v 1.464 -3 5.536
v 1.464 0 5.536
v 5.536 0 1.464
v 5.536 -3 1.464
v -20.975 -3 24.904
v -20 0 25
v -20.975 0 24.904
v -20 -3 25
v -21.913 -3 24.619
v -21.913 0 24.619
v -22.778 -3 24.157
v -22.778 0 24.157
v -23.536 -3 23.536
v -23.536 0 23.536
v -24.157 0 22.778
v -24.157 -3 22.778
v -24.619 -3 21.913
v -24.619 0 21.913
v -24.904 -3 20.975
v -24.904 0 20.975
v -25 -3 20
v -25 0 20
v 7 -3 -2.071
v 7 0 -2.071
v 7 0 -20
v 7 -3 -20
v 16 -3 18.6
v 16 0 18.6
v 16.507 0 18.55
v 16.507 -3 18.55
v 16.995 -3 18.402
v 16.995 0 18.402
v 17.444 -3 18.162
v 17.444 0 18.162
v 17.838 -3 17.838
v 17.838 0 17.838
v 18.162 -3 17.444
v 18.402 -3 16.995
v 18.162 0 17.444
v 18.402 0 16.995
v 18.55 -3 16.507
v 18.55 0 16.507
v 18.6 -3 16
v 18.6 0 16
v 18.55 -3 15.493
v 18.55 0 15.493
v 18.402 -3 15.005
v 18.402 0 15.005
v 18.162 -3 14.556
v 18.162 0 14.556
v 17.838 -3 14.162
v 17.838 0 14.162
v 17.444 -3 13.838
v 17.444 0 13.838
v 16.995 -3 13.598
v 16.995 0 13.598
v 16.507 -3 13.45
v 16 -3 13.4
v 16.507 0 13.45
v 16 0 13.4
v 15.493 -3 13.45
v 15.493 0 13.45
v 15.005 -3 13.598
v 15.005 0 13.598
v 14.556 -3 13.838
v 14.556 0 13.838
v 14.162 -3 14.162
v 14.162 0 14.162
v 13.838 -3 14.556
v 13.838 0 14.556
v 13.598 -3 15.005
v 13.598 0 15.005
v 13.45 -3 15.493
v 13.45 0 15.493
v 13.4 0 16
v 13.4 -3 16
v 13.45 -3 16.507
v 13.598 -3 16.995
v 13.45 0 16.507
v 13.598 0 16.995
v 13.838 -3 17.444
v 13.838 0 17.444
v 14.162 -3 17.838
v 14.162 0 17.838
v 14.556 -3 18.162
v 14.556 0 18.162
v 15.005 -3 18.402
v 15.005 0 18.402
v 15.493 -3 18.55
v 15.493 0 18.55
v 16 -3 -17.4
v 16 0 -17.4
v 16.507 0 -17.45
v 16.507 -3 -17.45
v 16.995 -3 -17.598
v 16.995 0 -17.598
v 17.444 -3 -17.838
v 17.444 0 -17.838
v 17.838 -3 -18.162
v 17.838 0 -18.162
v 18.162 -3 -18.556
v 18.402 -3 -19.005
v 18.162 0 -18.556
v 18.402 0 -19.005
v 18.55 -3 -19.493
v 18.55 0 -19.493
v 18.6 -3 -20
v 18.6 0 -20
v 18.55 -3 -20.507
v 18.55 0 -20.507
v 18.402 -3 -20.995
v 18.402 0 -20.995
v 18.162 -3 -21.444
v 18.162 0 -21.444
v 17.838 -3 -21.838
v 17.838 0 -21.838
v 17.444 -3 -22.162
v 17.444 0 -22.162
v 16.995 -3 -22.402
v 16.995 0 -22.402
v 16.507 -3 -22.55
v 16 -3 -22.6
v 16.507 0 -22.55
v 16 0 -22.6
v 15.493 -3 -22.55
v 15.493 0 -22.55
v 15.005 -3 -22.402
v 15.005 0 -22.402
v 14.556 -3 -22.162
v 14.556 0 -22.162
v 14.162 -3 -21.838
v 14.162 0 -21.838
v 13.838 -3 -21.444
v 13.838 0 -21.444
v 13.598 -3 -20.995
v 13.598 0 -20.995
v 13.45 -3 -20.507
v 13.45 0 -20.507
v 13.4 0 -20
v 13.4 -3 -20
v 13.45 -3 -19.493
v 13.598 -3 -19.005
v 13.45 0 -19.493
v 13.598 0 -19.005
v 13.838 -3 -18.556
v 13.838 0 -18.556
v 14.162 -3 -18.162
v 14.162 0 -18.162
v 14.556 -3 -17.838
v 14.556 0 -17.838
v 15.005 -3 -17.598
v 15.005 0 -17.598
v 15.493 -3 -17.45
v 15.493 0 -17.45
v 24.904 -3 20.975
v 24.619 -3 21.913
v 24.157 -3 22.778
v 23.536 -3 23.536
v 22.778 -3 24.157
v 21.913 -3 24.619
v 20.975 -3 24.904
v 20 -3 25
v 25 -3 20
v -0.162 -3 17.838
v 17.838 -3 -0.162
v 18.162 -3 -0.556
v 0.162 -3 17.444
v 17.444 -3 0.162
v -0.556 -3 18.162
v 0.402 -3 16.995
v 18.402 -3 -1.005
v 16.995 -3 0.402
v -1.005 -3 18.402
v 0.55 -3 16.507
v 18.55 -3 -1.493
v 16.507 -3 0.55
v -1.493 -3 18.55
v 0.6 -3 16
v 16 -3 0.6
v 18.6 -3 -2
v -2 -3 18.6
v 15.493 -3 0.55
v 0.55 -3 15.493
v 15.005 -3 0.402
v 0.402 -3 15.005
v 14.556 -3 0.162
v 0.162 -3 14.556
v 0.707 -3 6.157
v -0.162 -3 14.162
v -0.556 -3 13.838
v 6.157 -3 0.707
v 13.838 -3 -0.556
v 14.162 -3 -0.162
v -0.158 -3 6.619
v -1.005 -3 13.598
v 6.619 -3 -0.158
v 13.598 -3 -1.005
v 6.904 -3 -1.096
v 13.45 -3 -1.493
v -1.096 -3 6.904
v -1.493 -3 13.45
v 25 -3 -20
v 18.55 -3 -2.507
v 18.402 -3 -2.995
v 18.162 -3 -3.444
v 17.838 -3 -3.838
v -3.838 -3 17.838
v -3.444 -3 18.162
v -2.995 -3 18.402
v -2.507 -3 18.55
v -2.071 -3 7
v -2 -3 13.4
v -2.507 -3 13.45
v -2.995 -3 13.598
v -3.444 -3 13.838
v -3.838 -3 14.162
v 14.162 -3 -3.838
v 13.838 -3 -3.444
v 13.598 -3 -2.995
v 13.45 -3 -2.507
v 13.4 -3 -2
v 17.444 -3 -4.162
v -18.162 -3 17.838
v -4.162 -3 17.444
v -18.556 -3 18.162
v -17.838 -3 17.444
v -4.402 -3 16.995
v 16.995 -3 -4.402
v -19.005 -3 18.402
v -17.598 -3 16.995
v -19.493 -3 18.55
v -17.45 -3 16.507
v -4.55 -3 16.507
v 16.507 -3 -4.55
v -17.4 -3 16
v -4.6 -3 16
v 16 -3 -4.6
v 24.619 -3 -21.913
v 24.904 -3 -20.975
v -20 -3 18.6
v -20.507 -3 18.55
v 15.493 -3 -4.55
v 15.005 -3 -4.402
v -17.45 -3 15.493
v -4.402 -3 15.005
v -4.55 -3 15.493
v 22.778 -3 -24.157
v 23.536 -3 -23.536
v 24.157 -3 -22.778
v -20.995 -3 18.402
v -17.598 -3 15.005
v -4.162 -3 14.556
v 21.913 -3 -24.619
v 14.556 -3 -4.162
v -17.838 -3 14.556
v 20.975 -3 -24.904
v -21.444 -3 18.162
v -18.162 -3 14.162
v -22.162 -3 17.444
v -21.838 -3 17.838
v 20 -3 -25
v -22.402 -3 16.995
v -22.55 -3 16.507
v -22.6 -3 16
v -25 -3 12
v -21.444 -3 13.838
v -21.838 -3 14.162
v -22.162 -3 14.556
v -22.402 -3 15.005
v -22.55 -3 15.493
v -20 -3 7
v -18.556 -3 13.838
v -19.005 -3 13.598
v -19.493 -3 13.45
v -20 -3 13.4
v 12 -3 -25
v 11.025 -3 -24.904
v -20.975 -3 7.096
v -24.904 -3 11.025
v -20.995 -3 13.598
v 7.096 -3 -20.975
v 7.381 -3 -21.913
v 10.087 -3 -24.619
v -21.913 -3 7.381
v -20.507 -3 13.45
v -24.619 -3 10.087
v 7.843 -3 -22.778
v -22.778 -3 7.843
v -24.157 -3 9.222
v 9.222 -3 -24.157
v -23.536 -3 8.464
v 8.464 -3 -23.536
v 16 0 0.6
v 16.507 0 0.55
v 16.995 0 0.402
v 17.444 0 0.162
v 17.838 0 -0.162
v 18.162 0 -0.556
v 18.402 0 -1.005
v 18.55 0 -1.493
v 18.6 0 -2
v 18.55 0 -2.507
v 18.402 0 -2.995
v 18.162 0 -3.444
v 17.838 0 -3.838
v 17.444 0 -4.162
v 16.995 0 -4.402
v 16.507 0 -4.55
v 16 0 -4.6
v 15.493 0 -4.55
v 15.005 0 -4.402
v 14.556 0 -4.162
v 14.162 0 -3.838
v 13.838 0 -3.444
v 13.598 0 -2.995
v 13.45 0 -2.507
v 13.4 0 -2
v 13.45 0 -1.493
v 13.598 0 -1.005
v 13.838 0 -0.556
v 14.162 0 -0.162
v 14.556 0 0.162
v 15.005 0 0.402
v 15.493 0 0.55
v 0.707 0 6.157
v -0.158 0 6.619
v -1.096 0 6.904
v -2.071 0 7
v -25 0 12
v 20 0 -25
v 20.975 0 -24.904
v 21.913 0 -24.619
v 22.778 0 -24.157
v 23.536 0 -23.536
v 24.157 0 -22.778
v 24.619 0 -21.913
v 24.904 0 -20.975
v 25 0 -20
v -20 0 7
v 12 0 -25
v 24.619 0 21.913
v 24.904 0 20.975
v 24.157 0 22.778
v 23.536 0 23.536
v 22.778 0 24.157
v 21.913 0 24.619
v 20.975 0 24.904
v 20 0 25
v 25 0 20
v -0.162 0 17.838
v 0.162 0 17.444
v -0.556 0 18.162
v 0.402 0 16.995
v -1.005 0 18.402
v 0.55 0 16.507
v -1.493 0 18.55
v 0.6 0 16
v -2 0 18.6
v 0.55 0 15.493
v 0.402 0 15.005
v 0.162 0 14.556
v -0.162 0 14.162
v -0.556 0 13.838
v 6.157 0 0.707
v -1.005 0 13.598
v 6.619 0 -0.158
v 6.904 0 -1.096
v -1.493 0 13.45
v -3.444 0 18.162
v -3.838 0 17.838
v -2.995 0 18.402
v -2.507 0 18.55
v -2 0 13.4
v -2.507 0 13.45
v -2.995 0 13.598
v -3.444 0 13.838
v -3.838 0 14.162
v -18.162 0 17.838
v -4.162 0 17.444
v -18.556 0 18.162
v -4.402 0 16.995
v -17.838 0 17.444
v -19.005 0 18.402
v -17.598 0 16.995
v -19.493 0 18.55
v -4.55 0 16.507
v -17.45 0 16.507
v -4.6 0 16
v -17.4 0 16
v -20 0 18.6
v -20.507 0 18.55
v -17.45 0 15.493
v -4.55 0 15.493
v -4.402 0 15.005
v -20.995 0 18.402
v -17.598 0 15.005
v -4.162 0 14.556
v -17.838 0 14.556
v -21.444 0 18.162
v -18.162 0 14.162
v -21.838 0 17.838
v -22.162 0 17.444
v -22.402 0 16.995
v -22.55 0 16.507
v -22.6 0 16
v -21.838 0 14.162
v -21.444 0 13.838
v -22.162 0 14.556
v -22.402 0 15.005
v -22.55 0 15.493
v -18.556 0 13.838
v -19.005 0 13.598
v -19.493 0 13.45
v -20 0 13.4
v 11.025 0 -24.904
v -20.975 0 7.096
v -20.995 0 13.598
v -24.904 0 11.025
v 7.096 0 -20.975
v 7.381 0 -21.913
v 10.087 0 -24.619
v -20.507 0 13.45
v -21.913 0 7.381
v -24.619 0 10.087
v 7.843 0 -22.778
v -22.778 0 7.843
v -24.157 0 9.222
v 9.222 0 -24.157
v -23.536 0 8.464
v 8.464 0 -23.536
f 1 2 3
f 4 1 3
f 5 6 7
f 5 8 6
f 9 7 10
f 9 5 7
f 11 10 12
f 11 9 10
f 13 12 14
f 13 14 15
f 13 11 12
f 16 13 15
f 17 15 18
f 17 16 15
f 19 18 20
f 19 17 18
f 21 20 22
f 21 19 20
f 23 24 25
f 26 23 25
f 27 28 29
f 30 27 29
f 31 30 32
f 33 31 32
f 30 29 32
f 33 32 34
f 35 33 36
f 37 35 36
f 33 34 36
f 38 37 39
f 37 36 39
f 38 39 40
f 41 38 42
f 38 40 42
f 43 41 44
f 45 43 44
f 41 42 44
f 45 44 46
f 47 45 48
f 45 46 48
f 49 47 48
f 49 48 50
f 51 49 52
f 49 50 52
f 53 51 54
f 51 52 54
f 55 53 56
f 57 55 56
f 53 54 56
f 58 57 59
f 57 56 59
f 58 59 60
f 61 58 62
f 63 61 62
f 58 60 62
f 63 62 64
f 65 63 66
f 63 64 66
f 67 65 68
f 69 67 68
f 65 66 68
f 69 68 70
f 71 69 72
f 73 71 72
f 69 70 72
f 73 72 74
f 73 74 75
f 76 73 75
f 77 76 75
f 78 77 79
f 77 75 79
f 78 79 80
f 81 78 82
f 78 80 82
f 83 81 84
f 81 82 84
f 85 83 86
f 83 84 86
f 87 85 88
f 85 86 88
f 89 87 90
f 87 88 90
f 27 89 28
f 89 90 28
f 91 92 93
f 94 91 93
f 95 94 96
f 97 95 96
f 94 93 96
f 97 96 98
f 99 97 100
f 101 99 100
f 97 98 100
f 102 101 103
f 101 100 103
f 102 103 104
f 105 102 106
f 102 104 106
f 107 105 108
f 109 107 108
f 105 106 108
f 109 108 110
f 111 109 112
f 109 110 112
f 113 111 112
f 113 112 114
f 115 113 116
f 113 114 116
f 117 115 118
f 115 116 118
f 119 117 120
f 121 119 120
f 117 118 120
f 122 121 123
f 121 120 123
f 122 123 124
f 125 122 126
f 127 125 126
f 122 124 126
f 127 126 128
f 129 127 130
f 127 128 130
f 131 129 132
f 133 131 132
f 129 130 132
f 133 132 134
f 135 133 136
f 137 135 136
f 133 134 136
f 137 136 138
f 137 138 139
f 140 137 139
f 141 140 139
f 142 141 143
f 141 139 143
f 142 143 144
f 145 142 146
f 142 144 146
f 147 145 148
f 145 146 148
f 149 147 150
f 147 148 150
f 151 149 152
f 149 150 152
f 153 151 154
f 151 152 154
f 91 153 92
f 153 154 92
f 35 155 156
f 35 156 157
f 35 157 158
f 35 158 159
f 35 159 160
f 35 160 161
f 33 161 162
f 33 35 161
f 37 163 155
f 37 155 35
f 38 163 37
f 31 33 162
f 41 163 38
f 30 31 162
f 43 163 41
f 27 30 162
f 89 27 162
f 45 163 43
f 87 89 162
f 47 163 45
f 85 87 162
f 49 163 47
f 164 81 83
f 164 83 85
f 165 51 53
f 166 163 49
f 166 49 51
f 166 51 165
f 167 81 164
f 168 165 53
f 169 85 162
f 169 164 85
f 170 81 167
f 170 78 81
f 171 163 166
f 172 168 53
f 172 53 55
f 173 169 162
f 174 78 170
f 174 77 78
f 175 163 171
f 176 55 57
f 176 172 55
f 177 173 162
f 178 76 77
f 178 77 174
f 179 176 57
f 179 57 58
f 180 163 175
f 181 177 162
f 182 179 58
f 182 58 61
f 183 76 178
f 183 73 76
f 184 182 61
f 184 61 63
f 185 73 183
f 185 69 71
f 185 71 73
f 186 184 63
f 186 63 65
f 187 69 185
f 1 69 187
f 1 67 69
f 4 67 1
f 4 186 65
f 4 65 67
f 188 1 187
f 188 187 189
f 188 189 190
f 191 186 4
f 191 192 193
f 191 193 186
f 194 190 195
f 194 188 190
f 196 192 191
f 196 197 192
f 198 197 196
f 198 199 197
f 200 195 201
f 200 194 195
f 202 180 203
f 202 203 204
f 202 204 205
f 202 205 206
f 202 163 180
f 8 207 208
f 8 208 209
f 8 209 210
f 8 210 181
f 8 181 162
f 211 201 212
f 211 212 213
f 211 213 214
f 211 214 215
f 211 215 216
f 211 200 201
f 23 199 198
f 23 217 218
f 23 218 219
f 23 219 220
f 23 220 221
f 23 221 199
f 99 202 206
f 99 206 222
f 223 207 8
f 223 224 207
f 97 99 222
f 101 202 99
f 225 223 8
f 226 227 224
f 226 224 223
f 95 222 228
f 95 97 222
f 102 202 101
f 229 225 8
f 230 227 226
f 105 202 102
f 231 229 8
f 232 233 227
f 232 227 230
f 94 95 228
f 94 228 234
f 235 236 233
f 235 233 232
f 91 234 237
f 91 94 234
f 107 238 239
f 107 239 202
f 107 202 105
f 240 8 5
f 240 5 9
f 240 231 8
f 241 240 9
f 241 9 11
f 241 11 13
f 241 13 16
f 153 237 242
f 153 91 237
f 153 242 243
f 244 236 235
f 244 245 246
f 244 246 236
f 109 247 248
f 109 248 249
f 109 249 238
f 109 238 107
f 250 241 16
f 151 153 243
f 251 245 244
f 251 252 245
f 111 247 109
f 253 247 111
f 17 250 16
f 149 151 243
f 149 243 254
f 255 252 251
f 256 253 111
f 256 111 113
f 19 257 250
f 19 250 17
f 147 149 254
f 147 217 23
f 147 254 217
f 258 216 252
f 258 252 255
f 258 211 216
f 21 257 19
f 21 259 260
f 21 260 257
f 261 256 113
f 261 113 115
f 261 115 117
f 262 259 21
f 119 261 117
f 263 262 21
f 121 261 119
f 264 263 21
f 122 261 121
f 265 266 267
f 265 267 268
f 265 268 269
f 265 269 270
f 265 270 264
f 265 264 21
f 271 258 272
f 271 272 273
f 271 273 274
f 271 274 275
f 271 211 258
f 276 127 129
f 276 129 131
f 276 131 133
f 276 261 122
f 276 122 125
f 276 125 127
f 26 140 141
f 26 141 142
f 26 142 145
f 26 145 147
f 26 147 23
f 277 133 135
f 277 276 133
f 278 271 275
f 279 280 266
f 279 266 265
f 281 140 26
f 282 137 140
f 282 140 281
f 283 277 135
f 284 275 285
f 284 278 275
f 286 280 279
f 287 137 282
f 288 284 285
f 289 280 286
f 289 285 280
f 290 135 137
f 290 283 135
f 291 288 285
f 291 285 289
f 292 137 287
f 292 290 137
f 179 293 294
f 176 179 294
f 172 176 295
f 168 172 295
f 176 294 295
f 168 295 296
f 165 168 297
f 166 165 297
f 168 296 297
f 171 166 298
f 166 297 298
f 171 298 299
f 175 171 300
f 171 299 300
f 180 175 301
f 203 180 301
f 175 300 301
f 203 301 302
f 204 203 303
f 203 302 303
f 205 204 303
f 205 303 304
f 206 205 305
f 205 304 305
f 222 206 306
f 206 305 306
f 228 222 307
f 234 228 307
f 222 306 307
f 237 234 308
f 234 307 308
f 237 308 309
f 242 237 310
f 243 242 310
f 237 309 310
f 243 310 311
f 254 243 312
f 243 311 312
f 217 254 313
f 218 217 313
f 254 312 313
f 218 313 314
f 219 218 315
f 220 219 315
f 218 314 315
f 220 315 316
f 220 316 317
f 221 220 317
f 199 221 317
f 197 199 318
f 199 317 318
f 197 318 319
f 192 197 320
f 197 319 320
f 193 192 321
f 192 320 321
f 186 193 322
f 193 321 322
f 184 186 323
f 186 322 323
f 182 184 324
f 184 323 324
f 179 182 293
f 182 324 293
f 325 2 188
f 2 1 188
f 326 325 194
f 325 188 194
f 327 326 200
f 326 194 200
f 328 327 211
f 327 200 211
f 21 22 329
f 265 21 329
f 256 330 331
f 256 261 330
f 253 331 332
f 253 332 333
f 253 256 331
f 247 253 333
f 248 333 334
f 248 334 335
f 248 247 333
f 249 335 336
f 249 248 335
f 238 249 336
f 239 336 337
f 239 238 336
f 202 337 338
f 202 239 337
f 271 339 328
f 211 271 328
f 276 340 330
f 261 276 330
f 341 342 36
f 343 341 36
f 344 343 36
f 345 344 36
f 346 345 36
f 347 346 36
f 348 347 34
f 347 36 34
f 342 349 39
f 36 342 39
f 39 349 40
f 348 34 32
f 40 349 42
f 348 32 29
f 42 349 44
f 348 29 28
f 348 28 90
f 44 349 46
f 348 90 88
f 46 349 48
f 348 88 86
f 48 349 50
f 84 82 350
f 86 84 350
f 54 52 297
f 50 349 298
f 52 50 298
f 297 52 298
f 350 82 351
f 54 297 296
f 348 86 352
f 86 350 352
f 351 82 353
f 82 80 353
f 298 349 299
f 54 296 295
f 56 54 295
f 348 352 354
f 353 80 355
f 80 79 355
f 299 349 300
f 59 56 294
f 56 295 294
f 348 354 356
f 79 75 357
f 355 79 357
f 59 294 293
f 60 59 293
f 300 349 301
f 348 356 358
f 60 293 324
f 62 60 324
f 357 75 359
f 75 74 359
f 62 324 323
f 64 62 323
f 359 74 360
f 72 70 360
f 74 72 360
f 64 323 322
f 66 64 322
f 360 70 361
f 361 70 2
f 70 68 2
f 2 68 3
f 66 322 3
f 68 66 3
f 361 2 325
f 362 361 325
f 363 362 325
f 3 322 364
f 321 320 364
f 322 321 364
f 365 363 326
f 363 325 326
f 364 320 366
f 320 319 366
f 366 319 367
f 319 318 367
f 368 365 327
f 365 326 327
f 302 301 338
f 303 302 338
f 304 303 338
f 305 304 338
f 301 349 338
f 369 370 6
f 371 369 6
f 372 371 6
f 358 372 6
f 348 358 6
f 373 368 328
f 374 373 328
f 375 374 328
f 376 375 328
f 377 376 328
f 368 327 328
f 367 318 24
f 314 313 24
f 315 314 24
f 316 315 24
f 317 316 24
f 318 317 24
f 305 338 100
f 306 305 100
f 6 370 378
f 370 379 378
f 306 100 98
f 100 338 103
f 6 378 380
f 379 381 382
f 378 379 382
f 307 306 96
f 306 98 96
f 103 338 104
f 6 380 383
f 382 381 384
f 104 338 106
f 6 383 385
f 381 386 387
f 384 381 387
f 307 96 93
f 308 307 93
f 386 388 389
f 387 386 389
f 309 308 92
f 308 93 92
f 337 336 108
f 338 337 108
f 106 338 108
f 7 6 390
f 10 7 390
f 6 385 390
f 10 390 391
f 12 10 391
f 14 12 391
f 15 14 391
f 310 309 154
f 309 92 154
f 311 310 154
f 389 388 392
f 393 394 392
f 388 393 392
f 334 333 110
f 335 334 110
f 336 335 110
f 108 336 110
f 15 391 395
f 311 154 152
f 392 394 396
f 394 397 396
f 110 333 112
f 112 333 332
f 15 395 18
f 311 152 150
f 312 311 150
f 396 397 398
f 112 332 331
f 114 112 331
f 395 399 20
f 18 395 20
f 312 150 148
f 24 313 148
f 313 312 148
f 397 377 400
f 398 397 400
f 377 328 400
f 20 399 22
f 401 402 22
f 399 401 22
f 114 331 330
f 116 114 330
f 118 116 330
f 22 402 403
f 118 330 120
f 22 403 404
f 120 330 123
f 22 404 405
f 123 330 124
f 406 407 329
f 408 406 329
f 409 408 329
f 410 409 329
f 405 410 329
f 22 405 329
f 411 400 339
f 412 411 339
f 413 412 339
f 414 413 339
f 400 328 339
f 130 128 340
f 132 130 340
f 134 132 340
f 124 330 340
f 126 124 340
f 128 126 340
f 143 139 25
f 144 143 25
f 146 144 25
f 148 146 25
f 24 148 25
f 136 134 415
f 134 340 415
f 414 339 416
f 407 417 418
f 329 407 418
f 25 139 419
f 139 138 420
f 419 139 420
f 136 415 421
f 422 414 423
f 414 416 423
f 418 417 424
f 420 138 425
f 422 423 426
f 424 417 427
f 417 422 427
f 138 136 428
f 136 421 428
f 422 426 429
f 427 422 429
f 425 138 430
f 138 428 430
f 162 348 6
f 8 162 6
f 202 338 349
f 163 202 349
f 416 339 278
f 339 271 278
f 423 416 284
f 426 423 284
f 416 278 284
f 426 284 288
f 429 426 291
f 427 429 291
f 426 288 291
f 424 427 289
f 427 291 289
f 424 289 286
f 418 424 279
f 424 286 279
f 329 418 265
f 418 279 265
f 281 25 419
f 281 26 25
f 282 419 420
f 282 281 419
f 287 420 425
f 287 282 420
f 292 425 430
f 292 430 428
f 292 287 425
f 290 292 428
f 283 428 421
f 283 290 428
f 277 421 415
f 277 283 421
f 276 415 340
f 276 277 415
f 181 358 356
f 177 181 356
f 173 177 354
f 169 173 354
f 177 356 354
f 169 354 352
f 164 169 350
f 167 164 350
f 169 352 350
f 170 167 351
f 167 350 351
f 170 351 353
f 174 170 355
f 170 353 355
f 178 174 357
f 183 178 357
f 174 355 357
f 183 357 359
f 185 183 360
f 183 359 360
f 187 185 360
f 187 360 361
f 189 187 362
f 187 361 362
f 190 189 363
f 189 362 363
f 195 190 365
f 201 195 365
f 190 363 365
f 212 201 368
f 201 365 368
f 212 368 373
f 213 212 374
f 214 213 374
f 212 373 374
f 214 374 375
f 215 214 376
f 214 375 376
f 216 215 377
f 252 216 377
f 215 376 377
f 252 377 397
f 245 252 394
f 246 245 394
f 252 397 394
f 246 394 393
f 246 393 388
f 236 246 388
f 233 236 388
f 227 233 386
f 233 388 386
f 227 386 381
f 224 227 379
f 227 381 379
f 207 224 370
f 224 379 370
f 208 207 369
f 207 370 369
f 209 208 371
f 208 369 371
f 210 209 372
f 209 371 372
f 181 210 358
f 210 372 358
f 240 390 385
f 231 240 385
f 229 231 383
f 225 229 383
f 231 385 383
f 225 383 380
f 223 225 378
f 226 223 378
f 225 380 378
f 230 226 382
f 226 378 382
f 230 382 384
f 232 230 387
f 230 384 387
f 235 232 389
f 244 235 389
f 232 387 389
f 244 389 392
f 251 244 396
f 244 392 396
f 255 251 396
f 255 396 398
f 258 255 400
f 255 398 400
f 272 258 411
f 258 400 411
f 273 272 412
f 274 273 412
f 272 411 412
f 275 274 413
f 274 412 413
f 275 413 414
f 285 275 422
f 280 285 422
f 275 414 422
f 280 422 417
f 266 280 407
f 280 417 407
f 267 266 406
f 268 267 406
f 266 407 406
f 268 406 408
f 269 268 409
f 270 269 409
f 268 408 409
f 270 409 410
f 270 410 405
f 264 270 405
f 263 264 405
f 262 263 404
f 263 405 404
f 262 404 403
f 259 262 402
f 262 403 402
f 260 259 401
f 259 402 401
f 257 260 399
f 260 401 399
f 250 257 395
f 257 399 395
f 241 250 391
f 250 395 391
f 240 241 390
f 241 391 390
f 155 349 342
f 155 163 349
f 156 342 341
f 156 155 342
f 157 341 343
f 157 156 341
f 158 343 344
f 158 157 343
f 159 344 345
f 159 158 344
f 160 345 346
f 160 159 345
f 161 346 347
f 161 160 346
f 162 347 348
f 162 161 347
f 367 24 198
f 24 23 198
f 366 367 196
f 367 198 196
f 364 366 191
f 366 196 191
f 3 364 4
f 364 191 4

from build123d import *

# Parameters (mm, degrees)
SKETCH1_R          = 2.6
BASE_FLANGE1_DEPTH = 3
FILLET1_R          = 5
FILLET2_R          = 5


# Sheet-metal steps are written as plain solids
with BuildPart() as part:
    # Sketch1 → Base-Flange1 (new body)
    with BuildSketch(Plane(origin=(0, 0, 0), x_dir=(1, 0, 0), z_dir=(0, 1, 0))):
        Polygon((7, 25), (25, 25), (25, -25), (-25, -25), (-25, -7), (0, -7), (7, 0), align=None)
        with Locations(Location((16, -16, 0), (0, 0, 270))):
            Circle(SKETCH1_R, mode=Mode.SUBTRACT)
        with Locations(Location((-2, -16, 0), (0, 0, 270))):
            Circle(SKETCH1_R, mode=Mode.SUBTRACT)
        with Locations(Location((-20, -16, 0), (0, 0, 270))):
            Circle(SKETCH1_R, mode=Mode.SUBTRACT)
        with Locations(Location((16, 2, 0), (0, 0, 270))):
            Circle(SKETCH1_R, mode=Mode.SUBTRACT)
        with Locations(Location((16, 20, 0), (0, 0, 270))):
            Circle(SKETCH1_R, mode=Mode.SUBTRACT)
    extrude(amount=-BASE_FLANGE1_DEPTH)

    # Fillet1
    fillet1_edges = [part.edges().sort_by_distance(p)[0] for p in [
        (0, -1.5, 7),
        (7, -1.5, 0),
    ]]
    fillet(fillet1_edges, radius=FILLET1_R)

    # Fillet2
    fillet2_edges = [part.edges().sort_by_distance(p)[0] for p in [
        (25, -1.5, 25),
        (-25, -1.5, 25),
        (-25, -1.5, 7),
        (7, -1.5, -25),
        (25, -1.5, -25),
    ]]
    fillet(fillet2_edges, radius=FILLET2_R)


solid = part.part
